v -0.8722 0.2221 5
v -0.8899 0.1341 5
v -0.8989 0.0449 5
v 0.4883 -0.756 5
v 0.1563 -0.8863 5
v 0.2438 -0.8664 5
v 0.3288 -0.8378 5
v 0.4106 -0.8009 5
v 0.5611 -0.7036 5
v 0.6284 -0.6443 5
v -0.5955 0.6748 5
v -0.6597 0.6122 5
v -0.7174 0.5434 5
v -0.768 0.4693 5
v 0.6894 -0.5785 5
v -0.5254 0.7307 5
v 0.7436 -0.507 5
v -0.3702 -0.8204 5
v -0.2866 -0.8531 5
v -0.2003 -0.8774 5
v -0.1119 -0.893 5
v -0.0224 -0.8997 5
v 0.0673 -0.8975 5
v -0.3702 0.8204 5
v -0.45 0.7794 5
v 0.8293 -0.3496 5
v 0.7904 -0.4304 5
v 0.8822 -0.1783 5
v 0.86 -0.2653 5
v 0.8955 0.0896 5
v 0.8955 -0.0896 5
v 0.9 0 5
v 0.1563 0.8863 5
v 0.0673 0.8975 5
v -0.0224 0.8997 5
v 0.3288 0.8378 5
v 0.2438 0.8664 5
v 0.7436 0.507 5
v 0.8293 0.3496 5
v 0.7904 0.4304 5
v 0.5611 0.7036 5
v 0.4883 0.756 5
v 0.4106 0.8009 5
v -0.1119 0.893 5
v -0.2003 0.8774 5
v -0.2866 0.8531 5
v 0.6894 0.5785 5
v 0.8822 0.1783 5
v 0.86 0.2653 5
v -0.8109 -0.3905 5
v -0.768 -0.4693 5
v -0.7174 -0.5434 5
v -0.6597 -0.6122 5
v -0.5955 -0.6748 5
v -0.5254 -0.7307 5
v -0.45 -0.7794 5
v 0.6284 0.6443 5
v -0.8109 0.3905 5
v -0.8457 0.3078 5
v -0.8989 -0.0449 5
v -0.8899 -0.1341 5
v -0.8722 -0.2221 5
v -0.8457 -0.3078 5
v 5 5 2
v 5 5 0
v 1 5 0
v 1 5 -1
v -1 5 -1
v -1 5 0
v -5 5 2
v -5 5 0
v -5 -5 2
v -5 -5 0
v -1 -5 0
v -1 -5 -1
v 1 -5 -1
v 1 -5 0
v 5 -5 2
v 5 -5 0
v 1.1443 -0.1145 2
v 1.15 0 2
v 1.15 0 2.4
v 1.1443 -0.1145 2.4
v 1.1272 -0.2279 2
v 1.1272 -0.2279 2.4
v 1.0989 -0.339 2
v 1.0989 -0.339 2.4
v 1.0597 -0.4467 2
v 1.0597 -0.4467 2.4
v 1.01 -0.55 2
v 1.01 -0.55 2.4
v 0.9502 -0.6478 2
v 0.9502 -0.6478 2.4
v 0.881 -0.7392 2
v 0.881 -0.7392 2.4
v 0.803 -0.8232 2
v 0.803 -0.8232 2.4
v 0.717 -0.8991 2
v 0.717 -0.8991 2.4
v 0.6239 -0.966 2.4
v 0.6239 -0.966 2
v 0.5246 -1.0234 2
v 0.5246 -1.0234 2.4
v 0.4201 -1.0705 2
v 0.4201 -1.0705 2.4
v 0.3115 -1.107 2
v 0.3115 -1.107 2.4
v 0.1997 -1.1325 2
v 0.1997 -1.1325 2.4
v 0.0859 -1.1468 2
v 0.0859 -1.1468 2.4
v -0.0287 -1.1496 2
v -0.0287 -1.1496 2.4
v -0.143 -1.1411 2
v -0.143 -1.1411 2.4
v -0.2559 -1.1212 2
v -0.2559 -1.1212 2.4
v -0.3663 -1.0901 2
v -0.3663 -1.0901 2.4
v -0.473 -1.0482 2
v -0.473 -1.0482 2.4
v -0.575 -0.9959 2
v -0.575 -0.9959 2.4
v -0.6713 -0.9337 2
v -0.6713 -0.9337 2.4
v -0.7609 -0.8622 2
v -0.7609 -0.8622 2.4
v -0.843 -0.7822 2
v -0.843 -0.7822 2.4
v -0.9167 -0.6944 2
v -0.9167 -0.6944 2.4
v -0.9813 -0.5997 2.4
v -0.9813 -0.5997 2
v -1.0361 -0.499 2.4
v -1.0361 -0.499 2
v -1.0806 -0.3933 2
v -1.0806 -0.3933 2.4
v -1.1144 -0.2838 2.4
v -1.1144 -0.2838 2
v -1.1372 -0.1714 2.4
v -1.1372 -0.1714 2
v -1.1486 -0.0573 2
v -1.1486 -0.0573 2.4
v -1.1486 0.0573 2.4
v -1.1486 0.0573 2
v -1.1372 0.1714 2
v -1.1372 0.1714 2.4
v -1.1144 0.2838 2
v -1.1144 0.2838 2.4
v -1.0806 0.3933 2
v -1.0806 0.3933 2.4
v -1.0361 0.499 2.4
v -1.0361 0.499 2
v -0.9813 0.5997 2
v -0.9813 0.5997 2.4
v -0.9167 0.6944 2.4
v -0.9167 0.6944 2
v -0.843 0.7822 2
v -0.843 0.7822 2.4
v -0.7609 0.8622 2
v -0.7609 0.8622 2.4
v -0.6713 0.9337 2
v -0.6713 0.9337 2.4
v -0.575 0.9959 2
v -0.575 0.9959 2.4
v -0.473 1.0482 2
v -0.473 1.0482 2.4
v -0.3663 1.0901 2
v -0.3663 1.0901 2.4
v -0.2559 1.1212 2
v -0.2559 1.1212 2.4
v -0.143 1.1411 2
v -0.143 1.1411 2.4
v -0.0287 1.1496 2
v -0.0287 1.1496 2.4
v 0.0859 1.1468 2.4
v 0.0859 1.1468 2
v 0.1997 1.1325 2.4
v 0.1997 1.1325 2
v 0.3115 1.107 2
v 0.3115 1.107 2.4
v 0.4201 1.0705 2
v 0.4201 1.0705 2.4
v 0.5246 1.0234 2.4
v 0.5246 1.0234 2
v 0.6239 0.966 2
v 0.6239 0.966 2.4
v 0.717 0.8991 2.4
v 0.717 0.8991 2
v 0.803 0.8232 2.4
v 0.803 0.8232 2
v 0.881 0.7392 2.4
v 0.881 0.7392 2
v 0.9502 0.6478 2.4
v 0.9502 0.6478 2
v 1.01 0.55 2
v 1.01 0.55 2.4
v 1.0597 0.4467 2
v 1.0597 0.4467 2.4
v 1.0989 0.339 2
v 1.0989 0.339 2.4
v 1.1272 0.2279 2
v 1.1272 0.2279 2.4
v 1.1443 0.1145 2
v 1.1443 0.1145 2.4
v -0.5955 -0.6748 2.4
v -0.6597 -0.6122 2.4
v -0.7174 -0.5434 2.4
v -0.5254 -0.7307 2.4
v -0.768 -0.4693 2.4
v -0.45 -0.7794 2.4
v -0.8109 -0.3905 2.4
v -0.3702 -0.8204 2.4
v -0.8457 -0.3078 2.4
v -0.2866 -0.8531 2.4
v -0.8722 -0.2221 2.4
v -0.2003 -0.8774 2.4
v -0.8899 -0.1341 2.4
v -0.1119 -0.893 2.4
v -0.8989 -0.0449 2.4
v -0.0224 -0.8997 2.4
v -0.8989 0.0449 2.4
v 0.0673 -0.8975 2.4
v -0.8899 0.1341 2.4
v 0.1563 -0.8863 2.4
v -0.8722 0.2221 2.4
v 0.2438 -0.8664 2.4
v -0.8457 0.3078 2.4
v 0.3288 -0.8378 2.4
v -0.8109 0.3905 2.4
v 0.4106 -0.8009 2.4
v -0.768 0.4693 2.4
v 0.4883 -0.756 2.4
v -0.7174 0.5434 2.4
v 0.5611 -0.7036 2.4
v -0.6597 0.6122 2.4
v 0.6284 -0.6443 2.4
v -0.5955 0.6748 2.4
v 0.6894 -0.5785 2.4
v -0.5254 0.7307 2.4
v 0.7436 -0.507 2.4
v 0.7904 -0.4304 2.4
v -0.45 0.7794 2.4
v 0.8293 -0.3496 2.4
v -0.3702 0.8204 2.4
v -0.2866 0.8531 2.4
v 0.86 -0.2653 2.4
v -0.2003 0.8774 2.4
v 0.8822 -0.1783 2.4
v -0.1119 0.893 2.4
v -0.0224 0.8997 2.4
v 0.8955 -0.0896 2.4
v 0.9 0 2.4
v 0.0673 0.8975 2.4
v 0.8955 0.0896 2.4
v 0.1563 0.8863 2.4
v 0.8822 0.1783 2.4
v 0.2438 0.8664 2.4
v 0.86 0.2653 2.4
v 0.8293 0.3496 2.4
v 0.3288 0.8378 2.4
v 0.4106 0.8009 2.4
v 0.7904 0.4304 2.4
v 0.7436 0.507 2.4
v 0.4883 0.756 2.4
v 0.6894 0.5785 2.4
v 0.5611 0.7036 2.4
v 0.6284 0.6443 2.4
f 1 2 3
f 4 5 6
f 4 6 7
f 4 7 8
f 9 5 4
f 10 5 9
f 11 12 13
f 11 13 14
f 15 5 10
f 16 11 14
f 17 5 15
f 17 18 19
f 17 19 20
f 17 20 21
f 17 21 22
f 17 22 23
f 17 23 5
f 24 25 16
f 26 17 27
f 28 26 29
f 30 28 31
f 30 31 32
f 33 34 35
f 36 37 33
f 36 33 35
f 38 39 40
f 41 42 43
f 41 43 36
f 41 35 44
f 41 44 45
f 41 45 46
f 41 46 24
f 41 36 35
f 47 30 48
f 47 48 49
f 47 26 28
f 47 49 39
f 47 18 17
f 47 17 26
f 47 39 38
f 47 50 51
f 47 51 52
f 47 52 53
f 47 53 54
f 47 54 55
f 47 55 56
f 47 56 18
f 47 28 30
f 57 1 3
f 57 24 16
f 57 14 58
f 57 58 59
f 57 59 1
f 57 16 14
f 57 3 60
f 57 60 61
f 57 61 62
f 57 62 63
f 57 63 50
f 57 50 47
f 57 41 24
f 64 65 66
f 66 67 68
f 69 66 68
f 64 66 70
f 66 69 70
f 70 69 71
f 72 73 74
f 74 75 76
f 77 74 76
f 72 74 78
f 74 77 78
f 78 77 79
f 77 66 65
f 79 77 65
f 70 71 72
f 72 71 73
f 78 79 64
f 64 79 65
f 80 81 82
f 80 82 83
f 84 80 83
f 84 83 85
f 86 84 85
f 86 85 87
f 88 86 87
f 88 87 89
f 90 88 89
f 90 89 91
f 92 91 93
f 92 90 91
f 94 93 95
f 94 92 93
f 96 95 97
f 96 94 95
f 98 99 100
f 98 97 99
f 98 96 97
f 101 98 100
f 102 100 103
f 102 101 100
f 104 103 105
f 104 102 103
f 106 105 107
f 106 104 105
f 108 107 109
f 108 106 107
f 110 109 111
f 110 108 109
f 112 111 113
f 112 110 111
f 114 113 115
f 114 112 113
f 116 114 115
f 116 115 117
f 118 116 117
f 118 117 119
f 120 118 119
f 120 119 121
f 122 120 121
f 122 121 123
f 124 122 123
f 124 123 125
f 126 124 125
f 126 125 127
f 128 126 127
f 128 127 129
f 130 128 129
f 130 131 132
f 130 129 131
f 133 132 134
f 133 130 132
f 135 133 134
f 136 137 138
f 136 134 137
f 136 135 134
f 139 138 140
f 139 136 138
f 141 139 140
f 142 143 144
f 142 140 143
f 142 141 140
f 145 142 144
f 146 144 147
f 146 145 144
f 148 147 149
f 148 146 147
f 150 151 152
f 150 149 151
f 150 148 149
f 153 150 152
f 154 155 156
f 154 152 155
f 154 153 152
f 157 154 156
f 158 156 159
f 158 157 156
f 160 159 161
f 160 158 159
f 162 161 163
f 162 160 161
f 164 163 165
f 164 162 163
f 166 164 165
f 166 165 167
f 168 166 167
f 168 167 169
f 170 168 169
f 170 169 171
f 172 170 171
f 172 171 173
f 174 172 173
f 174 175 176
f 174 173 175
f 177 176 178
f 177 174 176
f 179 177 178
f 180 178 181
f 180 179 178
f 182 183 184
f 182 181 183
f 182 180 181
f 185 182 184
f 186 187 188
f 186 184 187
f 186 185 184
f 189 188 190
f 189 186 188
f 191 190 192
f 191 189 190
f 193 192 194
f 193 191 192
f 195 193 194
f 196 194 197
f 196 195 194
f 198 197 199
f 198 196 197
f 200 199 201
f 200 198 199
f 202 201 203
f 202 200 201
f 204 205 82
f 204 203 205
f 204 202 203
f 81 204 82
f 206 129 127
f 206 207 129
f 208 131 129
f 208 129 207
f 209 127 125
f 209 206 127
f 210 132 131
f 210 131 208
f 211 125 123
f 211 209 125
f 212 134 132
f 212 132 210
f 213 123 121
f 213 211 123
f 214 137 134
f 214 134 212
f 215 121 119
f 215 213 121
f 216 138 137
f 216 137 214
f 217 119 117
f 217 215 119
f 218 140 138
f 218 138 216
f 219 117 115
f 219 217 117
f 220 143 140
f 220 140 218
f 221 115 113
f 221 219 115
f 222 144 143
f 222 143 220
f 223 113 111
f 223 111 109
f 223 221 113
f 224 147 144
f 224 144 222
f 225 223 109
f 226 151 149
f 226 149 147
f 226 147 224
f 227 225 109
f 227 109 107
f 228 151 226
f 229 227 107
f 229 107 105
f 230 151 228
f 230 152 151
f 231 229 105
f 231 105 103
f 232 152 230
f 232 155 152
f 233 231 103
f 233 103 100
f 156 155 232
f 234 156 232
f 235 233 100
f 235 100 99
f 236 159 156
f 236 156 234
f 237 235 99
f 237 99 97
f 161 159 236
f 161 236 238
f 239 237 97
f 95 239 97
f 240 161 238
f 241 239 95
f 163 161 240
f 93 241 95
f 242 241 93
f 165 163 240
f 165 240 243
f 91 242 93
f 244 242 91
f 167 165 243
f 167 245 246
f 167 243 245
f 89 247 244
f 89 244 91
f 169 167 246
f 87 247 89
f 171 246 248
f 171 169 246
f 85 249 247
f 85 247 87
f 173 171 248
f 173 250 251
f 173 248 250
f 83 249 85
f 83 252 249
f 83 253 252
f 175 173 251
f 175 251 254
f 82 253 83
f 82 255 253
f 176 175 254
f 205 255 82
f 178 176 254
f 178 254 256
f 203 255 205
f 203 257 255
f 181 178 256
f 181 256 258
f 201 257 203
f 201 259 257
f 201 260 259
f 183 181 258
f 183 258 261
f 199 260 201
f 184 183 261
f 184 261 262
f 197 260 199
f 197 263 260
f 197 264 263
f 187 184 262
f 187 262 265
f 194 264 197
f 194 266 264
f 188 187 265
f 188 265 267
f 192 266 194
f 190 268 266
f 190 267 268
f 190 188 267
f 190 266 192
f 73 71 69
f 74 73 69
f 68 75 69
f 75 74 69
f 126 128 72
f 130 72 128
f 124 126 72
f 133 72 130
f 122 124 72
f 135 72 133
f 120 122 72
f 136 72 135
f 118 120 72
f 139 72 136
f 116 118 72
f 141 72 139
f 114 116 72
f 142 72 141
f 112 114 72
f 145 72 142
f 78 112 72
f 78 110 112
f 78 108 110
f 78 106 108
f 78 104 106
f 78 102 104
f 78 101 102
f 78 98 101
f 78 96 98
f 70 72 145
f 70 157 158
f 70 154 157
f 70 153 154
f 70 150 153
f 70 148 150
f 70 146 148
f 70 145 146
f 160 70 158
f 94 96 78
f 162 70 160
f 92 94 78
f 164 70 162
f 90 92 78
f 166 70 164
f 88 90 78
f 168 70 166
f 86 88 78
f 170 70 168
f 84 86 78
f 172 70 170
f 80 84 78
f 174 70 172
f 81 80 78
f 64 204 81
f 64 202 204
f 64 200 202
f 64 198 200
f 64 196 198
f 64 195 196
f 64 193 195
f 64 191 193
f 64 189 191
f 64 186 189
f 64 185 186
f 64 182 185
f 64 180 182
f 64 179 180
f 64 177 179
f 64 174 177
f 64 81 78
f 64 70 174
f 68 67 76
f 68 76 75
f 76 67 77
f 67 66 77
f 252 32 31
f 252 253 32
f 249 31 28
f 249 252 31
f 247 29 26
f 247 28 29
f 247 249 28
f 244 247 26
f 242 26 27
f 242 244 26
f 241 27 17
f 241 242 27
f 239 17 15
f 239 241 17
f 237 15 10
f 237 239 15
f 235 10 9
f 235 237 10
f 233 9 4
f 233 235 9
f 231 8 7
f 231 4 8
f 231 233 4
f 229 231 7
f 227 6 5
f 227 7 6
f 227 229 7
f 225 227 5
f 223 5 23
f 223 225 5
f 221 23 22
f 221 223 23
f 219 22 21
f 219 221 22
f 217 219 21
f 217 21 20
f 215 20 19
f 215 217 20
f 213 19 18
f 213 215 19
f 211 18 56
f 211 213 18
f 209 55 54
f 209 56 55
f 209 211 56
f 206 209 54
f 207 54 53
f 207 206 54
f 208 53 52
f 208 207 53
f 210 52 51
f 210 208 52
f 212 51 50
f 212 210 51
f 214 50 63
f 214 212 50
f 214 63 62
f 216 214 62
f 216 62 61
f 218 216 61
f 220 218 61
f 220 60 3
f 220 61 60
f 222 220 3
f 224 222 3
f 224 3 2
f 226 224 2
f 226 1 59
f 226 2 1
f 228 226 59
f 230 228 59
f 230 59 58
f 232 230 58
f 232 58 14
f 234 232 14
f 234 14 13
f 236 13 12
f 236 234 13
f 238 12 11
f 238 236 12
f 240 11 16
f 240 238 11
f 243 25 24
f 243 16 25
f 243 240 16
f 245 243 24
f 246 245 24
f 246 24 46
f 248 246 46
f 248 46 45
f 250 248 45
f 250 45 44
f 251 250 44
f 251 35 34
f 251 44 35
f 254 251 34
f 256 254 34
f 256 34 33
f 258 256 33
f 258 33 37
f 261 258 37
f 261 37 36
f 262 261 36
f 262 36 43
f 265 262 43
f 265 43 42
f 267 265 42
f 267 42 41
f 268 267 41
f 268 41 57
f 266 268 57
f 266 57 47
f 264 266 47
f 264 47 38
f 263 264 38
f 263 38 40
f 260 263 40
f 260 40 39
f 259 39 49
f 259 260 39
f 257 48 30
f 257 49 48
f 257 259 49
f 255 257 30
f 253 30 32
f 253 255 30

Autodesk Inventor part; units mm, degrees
ref_plane "YZ Plane" through (0, 0, 0) normal (1, 0, 0) x (0, 1, 0)
ref_plane "XZ Plane" through (0, 0, 0) normal (0, 1, 0) x (-1, 0, 0)
ref_plane "XY Plane" through (0, 0, 0) normal (0, 0, 1) x (1, 0, 0)
sketch "Sketch1" plane through (0, 0, 0) normal (0, 0, 1) x (1, 0, 0)
  line L0 (-5, -5) -> (5, -5)
  line L1 (5, -5) -> (5, 5)
  line L2 (5, 5) -> (-5, 5)
  line L3 (-5, 5) -> (-5, -5)
  line L4 (-5, -5) -> (5, 5) construction
  line L5 (5, -5) -> (-5, 5) construction
  point P0 (0, 0)
  dimension "d0" = 10
  dimension "d1" = 10
extrude "Extrusion1" add sketch "Sketch1" along normal blind 2
sketch "Sketch2" plane through (0, 0, 2) normal (0, 0, 1) x (1, 0, 0)
  circle A0 centre (0, 0) radius 0.9
  dimension "d4" = 1.8
extrude "Extrusion2" add sketch "Sketch2" along normal blind 3
sketch "Sketch4" plane through (0, 0, 0) normal (0, 0, -1) x (-1, 0, 0)
  line L0 (5, -5) -> (-5, -5) projected
  line L1 (1, 5) -> (-1, 5)
  line L2 (-1, 5) -> (-1, -5)
  line L3 (-1, -5) -> (1, -5)
  line L4 (1, -5) -> (1, 5)
  circle A0 centre (0, 0) radius 0.9 projected
  line L5 (1, 5) -> (-1, -5) construction
  line L6 (-1, 5) -> (1, -5) construction
  dimension "d7" = 2
extrude "Extrusion3" add sketch "Sketch4" along normal blind 1 contours L0 L2 L1 L4 | A0
sketch "Sketch5" plane through (0, 0, 2) normal (0, 0, 1) x (1, 0, 0)
  circle A0 centre (0, 0) radius 0.9 projected
  circle A1 centre (0, 0) radius 1.15
  dimension "d10" = 2.3
extrude "Extrusion4" add sketch "Sketch5" along normal blind 0.4
properties part number "TrzymakNaLozysko"
